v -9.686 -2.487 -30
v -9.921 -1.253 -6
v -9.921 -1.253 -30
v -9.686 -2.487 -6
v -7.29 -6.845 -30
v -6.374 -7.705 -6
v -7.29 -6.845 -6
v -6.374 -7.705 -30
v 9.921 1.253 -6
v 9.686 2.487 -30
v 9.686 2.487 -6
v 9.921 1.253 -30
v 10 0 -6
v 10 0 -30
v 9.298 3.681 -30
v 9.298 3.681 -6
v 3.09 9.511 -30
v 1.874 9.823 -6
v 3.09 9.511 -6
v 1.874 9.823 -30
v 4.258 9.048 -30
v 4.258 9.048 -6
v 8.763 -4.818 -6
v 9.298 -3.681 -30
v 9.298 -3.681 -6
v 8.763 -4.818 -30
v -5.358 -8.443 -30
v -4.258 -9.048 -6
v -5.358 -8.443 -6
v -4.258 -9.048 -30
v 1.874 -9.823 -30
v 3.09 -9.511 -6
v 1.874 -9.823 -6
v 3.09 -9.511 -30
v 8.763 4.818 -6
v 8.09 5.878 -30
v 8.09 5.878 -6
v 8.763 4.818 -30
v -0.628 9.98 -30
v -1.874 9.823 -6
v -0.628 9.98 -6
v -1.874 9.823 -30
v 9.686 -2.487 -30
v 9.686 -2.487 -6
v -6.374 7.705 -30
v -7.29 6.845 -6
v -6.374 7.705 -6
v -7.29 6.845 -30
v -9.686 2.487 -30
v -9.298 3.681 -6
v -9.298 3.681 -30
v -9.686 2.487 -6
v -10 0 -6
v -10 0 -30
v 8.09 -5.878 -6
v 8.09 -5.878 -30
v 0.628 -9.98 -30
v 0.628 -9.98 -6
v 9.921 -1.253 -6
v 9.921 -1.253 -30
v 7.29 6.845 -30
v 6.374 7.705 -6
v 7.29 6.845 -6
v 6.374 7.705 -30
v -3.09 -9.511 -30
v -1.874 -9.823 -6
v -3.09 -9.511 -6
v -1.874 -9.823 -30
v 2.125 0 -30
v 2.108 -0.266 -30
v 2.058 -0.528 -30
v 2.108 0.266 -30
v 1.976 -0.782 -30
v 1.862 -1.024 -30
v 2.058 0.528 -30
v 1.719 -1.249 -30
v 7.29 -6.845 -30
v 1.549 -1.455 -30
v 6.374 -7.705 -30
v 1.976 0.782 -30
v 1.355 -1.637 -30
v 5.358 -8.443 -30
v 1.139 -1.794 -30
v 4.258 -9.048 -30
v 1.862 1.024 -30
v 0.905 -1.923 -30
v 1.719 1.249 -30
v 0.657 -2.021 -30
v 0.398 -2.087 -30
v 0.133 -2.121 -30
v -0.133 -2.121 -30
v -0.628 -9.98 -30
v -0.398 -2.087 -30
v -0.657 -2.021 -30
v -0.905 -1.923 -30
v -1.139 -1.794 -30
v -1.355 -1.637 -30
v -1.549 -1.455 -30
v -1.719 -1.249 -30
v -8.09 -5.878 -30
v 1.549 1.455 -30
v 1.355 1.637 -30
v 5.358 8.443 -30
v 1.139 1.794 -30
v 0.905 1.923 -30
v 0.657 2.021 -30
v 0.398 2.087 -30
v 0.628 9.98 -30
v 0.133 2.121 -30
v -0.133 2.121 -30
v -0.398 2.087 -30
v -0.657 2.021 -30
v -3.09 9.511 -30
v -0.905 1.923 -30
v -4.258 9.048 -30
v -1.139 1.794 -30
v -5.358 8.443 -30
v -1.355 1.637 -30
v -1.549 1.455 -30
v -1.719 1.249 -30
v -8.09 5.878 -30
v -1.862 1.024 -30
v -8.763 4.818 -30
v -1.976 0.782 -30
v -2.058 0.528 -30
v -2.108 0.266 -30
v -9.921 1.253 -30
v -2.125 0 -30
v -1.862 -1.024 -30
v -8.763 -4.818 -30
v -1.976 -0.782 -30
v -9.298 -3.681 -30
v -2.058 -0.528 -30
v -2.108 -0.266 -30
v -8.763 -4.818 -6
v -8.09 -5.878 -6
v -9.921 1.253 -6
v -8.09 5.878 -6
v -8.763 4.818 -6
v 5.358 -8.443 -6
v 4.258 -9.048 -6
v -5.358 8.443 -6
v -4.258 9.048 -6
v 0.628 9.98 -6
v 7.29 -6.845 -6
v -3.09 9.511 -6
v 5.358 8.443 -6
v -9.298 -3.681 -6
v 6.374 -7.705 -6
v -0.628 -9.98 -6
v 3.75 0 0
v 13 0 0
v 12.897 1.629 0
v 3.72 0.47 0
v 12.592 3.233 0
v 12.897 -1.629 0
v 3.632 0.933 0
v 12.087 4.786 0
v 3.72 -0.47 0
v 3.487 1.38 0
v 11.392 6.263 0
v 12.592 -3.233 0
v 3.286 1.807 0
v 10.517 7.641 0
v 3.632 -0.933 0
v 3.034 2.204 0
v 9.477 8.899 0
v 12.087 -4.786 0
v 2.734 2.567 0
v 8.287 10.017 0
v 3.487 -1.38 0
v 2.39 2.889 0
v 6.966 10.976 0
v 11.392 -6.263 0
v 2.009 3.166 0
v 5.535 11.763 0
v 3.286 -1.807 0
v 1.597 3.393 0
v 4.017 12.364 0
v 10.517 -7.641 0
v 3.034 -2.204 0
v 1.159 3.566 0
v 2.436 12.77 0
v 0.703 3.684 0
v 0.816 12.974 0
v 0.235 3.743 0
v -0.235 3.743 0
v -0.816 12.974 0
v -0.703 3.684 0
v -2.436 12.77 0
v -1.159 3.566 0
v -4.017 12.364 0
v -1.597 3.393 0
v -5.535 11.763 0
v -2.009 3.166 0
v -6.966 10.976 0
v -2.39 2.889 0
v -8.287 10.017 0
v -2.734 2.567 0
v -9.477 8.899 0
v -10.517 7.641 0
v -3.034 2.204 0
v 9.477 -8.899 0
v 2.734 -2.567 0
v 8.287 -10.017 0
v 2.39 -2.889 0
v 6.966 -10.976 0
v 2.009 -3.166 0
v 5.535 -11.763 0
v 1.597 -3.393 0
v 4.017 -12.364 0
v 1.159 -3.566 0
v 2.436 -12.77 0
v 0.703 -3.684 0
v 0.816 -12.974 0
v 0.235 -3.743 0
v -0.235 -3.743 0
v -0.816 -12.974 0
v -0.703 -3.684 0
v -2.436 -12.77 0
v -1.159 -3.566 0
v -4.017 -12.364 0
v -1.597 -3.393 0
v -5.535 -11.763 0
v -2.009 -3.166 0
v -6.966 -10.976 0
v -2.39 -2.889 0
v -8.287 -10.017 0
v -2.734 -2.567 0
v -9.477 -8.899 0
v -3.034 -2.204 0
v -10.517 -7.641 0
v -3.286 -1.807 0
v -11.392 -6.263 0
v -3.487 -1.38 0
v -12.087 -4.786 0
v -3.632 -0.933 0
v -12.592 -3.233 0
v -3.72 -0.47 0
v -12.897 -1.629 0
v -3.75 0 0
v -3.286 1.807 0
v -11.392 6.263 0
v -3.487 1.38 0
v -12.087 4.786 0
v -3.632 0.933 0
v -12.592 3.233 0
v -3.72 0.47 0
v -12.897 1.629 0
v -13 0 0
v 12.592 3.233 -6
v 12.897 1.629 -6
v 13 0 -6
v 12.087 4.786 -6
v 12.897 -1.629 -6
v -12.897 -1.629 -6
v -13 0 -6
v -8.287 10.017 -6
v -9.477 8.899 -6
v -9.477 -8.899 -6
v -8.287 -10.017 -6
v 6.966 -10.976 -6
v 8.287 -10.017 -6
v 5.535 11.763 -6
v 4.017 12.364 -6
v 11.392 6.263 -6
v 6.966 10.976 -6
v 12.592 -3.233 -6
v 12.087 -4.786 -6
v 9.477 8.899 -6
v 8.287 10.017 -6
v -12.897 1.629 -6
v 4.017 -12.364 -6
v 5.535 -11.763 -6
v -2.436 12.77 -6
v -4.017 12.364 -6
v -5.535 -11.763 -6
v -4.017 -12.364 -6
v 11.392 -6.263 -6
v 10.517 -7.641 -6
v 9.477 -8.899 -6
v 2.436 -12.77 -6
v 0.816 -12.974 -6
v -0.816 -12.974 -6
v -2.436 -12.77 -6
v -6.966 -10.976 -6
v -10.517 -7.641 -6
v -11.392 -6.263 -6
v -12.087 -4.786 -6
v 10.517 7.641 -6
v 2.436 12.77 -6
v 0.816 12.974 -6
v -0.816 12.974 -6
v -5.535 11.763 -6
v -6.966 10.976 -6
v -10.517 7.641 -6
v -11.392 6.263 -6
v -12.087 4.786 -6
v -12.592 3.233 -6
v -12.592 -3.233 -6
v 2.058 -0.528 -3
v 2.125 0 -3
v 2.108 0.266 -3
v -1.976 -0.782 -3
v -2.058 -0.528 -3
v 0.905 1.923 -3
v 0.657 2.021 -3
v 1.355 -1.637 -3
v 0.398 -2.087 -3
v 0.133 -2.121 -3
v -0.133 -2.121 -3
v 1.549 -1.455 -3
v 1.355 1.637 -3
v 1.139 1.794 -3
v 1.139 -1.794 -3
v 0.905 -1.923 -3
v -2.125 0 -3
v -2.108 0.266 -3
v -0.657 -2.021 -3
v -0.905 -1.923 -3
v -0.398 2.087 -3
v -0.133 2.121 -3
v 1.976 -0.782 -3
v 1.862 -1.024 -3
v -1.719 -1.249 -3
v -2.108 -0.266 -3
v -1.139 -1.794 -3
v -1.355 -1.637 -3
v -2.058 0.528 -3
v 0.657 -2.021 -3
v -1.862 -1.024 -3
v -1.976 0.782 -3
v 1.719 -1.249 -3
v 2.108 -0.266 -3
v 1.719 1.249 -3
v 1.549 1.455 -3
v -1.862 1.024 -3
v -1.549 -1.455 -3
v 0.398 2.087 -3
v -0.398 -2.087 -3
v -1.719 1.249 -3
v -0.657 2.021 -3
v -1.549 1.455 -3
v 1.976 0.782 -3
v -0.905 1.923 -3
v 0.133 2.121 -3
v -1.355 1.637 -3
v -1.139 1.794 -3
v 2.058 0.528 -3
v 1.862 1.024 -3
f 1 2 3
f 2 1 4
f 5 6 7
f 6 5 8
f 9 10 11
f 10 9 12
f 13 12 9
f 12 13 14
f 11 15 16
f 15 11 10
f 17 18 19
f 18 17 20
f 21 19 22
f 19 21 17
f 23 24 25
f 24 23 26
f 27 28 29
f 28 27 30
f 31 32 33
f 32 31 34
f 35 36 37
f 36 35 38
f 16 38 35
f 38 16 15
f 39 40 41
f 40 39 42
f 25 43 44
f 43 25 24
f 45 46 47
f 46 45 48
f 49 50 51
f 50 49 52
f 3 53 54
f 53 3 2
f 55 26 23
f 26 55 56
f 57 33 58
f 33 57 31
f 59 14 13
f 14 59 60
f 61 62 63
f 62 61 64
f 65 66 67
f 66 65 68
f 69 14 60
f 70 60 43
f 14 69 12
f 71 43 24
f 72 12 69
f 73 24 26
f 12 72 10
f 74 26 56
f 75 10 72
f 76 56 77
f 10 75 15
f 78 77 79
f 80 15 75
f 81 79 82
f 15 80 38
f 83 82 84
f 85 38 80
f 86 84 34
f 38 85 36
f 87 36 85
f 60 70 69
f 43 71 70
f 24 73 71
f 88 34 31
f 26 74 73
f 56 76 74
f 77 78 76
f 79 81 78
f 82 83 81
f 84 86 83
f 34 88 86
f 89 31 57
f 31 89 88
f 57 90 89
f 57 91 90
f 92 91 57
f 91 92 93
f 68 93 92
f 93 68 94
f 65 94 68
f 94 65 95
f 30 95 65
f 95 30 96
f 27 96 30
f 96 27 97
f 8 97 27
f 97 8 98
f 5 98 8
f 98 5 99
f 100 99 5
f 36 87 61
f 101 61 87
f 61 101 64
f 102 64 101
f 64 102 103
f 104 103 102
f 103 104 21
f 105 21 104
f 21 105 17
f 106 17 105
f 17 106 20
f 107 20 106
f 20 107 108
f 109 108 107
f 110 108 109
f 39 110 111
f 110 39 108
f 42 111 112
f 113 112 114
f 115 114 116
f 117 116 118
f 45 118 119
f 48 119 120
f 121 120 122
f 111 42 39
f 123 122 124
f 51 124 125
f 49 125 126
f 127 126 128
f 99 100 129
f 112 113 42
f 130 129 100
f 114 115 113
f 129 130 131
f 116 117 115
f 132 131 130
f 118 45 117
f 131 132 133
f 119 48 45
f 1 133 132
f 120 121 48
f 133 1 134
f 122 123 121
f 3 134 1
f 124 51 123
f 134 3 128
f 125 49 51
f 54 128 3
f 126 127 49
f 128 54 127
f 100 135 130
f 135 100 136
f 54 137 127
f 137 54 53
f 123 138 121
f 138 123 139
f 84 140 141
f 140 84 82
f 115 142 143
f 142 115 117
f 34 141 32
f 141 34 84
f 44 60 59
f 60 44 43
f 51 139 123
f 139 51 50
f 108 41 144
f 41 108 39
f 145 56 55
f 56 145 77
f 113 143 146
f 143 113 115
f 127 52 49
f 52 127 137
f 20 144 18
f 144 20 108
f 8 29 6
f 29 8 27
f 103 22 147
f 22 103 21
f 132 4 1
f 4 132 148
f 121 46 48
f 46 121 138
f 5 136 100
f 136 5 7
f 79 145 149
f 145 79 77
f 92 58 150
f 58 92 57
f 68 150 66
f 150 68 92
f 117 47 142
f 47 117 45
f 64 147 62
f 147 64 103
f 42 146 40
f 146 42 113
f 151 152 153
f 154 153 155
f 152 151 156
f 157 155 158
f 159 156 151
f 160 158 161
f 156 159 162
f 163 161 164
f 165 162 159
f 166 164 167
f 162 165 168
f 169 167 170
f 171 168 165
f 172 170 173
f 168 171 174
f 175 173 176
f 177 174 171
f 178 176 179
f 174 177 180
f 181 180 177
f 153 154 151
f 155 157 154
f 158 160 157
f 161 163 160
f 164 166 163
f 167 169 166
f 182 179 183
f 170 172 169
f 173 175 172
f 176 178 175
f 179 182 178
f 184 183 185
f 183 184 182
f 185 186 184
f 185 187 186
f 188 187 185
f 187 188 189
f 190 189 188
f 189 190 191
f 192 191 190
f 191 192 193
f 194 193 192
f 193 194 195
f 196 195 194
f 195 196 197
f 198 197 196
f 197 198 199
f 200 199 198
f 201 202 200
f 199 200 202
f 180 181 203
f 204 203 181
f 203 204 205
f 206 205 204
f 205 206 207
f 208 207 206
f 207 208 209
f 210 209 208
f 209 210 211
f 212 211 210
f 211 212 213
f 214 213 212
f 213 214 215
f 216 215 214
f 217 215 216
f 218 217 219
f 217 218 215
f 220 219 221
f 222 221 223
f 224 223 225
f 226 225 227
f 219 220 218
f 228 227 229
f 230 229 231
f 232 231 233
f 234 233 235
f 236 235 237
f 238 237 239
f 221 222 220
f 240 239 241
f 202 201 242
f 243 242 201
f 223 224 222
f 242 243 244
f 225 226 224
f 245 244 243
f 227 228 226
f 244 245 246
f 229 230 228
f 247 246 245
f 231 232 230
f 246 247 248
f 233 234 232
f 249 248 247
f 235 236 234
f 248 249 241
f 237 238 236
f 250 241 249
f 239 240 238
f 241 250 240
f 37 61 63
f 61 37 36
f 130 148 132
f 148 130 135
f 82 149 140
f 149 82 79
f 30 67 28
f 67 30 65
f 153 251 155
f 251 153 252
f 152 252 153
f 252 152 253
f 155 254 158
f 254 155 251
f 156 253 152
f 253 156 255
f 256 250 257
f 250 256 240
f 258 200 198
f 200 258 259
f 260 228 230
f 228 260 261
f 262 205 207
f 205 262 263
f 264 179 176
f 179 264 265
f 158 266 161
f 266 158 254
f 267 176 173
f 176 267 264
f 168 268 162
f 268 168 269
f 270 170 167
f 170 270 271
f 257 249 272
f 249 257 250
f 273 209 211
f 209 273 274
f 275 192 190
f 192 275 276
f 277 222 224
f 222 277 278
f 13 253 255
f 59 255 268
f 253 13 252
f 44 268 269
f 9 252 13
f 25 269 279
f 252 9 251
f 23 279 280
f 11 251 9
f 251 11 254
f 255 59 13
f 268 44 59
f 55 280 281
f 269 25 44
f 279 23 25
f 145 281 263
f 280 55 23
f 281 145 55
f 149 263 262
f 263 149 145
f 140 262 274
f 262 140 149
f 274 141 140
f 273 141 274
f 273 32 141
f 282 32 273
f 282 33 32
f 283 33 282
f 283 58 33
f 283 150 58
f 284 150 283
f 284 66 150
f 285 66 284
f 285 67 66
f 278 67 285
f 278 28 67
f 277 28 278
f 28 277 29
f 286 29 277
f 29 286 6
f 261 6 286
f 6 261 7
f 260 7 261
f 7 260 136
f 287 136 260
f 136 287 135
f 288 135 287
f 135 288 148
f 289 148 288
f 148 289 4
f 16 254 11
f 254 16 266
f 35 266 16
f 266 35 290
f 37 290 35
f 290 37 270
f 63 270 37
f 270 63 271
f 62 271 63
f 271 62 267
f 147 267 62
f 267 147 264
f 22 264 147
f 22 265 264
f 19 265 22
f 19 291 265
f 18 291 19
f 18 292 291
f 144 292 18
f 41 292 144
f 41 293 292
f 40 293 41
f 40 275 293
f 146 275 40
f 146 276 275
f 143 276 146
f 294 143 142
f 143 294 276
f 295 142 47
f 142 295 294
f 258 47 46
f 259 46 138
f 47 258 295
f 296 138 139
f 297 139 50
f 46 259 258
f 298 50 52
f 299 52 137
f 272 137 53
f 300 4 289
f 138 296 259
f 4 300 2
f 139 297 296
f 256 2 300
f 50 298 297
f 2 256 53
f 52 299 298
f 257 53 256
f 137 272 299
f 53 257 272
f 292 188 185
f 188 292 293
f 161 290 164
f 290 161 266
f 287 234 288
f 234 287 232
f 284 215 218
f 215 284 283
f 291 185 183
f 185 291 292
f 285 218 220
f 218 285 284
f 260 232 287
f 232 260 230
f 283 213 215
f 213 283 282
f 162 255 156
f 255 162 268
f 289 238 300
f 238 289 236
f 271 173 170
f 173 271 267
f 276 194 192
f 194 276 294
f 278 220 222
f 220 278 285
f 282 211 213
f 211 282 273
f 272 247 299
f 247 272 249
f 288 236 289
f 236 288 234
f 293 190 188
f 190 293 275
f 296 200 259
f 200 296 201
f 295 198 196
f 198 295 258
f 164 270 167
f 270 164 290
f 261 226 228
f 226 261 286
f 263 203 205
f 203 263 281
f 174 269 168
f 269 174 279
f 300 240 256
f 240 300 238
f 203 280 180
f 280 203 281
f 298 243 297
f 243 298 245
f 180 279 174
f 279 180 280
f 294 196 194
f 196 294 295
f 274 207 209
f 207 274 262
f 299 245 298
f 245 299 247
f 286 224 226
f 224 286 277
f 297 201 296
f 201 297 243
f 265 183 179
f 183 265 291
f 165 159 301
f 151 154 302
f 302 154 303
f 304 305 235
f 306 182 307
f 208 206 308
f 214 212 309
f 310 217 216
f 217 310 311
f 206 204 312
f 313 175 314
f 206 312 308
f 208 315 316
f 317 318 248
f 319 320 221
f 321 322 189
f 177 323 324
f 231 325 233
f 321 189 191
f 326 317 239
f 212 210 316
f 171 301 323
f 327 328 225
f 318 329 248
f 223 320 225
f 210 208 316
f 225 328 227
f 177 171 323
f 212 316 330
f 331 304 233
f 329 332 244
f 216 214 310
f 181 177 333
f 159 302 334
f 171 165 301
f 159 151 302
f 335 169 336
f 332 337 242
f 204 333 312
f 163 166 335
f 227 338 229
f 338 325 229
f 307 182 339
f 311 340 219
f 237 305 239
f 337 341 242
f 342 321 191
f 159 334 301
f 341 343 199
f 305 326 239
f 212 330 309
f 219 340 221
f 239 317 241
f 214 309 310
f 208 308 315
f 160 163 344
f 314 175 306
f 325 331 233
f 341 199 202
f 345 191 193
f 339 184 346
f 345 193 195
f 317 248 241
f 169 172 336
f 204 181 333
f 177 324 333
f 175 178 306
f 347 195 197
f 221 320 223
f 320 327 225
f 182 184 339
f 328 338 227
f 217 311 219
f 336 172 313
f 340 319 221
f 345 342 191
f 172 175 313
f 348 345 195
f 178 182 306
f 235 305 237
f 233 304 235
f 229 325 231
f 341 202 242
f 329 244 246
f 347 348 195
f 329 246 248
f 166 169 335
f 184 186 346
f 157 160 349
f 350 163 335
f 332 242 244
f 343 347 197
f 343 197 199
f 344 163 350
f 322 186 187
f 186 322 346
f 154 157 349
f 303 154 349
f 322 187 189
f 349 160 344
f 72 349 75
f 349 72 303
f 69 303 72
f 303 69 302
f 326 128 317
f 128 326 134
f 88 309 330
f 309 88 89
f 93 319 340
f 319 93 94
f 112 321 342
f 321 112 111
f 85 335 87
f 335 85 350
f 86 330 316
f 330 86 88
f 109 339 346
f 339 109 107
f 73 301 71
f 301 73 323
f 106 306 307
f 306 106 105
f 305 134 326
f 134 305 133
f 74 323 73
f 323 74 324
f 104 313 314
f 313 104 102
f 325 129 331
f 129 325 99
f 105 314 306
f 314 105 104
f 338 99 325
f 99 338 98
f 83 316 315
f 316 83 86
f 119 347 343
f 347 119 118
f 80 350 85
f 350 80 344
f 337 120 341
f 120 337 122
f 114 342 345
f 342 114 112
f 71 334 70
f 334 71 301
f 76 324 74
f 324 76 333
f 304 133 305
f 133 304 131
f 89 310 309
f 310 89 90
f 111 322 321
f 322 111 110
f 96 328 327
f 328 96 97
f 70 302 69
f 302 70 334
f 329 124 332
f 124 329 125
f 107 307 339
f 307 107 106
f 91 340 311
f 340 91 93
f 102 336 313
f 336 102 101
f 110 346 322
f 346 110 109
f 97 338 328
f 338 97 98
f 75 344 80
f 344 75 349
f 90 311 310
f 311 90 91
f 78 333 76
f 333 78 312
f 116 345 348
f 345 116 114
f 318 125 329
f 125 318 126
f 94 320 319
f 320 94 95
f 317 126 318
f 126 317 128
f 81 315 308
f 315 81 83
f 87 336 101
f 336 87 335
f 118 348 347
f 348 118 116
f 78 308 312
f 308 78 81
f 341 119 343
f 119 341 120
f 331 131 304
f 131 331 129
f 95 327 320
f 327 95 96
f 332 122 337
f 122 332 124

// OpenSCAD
$fn = 50;


difference() {
	union() {
		translate(v = [0, 0, -30.0000000000]) {
			cylinder(h = 30, r = 10.0000000000);
		}
		translate(v = [0, 0, -6.0000000000]) {
			cylinder(h = 6, r = 13.0000000000);
		}
	}
	union() {
		translate(v = [0, 0, 0]) {
			rotate(a = [0, 0, 0]) {
				difference() {
					union() {
						#translate(v = [0, 0, -30.0000000000]) {
							cylinder(h = 30, r = 2.0000000000);
						}
						#translate(v = [0, 0, -3]) {
							cylinder(h = 3, r1 = 2.1250000000, r2 = 3.7500000000);
						}
						#translate(v = [0, 0, -30.0000000000]) {
							cylinder(h = 30, r = 2.1250000000);
						}
						#translate(v = [0, 0, -30.0000000000]) {
							cylinder(h = 30, r = 2.0000000000);
						}
					}
					union();
				}
			}
		}
	}
}
